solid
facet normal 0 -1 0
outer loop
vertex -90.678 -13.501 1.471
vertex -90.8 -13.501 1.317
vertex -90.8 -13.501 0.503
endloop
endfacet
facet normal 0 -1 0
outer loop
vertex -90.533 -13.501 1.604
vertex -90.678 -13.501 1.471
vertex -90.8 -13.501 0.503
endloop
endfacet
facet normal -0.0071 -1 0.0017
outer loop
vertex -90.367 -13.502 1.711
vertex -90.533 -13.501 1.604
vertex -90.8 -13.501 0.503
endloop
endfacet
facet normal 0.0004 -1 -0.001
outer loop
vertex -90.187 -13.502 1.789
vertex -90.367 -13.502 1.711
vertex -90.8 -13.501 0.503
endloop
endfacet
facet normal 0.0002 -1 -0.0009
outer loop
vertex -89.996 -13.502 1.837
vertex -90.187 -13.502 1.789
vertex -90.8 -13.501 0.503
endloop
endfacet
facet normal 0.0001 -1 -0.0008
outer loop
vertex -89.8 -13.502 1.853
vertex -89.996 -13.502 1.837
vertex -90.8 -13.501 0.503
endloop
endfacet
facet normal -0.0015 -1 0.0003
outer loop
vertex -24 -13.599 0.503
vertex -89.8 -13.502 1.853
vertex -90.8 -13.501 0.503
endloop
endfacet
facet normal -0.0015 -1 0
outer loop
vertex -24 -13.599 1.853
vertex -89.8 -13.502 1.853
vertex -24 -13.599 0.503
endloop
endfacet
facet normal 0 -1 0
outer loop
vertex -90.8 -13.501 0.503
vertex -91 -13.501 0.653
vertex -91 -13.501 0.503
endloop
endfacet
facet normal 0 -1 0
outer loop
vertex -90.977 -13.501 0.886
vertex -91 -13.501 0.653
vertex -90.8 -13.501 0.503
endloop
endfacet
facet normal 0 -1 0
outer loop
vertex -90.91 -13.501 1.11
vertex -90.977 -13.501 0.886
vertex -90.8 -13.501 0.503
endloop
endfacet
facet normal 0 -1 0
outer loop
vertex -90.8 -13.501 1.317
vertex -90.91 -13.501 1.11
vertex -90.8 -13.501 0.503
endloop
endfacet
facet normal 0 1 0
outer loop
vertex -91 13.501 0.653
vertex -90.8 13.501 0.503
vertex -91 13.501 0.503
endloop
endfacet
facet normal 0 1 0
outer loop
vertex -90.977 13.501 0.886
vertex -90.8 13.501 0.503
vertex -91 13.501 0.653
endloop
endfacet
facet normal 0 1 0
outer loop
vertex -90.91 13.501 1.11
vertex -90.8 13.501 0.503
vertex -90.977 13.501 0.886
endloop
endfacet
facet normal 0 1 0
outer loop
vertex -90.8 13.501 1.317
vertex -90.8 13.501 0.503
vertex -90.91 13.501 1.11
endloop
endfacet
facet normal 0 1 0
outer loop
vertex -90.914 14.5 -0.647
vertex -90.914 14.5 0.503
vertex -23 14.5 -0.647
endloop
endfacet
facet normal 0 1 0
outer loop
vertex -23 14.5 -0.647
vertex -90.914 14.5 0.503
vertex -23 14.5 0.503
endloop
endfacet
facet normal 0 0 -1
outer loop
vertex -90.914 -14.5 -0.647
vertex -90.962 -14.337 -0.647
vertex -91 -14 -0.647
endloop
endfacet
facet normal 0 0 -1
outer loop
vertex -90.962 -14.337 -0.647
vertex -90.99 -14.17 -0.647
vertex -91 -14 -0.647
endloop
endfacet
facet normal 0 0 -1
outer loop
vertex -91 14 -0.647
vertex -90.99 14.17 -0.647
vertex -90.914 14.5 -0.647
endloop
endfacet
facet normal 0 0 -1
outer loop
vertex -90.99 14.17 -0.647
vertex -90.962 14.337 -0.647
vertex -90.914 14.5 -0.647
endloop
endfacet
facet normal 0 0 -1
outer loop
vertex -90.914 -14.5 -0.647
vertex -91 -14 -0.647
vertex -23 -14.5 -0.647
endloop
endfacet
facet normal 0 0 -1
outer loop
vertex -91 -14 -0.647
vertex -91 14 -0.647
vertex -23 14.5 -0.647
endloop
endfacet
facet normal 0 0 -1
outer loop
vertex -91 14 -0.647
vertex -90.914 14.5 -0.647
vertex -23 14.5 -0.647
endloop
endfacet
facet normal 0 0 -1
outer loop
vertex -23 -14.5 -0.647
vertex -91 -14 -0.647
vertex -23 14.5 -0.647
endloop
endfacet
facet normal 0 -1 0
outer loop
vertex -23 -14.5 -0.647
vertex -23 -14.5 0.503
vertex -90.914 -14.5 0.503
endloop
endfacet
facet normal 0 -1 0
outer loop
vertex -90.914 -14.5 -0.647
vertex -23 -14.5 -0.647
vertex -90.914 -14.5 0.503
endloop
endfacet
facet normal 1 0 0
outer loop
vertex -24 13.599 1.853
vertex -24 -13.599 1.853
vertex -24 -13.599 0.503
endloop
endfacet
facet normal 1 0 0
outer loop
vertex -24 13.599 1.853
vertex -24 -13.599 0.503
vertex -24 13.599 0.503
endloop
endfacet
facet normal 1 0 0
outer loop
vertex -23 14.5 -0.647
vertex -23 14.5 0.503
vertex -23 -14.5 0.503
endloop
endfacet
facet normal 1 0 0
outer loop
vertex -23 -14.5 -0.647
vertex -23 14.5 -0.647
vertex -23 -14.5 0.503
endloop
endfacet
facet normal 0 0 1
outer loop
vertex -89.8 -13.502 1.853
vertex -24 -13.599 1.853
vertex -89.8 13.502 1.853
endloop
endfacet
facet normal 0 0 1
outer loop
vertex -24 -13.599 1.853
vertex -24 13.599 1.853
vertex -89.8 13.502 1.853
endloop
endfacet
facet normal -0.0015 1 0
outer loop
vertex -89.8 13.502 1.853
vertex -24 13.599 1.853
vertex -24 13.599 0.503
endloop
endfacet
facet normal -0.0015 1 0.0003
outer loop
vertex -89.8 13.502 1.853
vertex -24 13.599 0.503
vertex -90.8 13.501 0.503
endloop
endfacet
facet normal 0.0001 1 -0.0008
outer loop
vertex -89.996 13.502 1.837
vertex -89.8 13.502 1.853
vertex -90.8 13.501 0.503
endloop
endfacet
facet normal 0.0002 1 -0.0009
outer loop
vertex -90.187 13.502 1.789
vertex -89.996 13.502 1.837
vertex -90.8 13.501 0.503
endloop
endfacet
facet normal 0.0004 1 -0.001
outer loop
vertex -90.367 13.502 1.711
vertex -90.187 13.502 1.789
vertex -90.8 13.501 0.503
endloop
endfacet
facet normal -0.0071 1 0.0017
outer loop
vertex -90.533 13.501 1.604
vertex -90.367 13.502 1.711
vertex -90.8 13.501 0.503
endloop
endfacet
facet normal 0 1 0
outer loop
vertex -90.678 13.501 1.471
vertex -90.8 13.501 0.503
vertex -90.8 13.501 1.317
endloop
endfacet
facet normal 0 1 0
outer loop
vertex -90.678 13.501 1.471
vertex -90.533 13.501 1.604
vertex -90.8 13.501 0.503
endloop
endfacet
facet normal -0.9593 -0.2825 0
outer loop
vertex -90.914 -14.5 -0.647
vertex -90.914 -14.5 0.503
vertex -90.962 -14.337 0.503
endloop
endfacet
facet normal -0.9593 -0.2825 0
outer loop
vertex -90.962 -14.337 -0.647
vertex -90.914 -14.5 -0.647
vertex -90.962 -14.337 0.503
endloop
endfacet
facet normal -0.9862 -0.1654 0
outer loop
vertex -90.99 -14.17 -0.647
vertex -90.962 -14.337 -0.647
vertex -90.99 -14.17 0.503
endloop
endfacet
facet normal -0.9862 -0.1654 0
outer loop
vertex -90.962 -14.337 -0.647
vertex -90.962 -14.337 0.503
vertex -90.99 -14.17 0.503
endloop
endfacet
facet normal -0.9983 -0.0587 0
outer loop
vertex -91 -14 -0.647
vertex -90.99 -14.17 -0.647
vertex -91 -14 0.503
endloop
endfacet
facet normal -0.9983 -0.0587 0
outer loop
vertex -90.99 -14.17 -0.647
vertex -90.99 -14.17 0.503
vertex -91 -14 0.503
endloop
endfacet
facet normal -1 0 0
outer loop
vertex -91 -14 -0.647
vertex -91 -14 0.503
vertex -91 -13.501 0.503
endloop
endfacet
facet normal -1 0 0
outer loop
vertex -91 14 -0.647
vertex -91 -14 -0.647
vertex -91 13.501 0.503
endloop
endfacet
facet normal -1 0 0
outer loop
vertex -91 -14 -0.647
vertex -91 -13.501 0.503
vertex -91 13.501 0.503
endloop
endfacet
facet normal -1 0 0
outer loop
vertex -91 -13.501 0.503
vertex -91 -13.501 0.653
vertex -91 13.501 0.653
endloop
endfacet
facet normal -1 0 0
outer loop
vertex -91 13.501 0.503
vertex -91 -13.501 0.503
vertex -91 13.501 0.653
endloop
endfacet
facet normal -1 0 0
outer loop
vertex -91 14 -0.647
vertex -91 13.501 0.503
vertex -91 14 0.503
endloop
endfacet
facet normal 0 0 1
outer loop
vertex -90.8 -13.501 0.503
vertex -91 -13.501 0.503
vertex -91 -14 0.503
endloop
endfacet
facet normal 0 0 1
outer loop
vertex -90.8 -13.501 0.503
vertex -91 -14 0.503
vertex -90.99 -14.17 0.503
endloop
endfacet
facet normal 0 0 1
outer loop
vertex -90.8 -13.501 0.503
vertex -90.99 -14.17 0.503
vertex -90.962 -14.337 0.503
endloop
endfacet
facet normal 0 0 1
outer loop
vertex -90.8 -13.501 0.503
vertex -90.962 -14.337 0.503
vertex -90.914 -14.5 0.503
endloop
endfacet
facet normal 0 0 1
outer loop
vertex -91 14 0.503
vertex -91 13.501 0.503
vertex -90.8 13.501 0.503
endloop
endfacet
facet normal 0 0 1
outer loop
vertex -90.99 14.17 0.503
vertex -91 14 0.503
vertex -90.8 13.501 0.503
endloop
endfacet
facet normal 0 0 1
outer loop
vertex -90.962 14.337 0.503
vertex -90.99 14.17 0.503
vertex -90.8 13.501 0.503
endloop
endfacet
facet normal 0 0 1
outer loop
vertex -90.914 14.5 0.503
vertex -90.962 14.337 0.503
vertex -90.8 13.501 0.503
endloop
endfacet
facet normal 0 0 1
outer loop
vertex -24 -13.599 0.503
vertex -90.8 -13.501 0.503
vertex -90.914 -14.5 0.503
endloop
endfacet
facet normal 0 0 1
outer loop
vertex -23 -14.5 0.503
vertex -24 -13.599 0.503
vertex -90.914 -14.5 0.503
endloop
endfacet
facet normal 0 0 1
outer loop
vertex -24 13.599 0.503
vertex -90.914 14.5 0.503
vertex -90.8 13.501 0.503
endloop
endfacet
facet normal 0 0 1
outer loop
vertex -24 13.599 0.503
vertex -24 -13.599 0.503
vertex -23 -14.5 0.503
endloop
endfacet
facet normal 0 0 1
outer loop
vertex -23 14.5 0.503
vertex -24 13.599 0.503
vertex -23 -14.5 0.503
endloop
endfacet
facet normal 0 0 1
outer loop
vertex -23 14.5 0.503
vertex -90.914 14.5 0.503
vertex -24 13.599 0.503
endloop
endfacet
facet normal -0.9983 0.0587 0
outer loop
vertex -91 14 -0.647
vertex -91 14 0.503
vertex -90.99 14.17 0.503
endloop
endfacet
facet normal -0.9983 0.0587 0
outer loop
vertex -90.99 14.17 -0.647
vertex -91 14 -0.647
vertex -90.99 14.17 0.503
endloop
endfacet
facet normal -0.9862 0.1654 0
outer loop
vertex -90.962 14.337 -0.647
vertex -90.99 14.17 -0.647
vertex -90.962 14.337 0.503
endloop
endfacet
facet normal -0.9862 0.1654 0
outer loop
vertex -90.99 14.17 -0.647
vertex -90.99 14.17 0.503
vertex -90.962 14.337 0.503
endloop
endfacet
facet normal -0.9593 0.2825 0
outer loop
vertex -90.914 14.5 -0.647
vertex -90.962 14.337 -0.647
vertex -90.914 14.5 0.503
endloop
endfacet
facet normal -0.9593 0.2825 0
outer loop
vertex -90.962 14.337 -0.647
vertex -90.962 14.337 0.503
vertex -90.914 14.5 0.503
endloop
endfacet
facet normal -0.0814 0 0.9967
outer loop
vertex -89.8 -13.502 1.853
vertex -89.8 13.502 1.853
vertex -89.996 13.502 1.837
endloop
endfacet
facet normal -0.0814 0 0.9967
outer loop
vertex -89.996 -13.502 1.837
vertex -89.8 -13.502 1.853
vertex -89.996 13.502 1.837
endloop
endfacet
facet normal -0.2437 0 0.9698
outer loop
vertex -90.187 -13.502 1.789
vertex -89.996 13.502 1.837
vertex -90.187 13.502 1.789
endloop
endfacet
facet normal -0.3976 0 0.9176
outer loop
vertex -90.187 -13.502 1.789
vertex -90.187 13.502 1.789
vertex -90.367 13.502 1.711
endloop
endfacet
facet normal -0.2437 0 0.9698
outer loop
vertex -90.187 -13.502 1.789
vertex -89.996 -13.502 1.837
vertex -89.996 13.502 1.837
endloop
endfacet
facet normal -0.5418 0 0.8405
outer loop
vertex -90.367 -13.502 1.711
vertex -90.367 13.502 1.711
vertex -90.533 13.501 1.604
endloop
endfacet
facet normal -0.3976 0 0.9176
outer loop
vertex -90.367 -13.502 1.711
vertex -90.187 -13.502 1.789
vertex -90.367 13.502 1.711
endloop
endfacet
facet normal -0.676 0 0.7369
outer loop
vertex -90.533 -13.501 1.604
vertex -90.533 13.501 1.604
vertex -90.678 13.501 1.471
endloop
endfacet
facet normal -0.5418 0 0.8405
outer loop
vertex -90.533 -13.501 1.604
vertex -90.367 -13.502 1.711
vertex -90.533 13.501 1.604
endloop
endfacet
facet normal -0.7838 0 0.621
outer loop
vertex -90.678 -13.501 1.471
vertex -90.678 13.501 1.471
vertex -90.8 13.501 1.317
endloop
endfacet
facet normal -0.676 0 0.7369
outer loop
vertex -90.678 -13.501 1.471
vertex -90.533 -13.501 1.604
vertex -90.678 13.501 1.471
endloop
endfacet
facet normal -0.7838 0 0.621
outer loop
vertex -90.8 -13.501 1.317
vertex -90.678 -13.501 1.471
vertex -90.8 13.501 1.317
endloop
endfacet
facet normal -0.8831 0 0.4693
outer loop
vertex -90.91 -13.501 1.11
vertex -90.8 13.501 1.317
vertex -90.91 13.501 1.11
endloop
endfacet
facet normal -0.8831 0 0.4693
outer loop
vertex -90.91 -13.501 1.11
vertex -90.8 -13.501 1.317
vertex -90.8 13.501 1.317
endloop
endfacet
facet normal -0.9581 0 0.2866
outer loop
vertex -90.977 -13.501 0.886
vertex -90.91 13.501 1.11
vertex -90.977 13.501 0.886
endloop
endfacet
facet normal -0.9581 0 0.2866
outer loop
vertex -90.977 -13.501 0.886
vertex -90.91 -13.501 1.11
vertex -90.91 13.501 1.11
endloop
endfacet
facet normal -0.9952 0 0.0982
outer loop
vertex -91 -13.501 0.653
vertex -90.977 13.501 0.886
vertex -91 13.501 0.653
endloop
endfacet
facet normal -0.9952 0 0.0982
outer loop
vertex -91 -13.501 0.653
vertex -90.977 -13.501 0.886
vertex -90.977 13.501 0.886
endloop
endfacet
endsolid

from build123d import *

# Parameters (mm, degrees)
EXTRUDE_1_DEPTH     = 1.15
CUT_EXTRUDE_1_DEPTH = 1.23
EXTRUDE_2_DEPTH     = 1.35
CUT_EXTRUDE_START   = -10
CUT_EXTRUDE_2_DEPTH = 10
CUT_EXTRUDE_3_DEPTH = 1.35
FILLET_1_R          = 1.2


with BuildPart() as part:
    # 草图1 → 凸台-拉伸1 (new body)
    with BuildSketch(Plane.XY.offset(-0.646576548)):
        with BuildLine():
            Line((-91.3, 11.1), (-91.3, -11.1))
            Line((-91.3, -11.1), (-91.3, -14))
            ThreePointArc((-91.3, -14), (-91.252485776, -14.410844989), (-91.11245155, -14.8))
            Line((-91.11245155, -14.8), (-22.7, -14.8))
            Line((-22.7, -14.8), (-22.7, 14.8))
            Line((-22.7, 14.8), (-91.11245155, 14.8))
            ThreePointArc((-91.11245155, 14.8), (-91.252485776, 14.410844989), (-91.3, 14))
            Line((-91.3, 14), (-91.3, 11.1))
        make_face()
    extrude(amount=EXTRUDE_1_DEPTH)

    # 草图2 → 切除-拉伸1 (cut)
    with BuildSketch(Plane.XY.offset(0.503423452)):
        with BuildLine():
            Line((-91.4, 14), (-91.4, -14))
            ThreePointArc((-91.4, -14), (-91.342458697, -14.464053822), (-91.173320053, -14.9))
            Line((-91.173320053, -14.9), (-22.6, -14.9))
            Line((-22.6, -14.9), (-22.6, 14.9))
            Line((-22.6, 14.9), (-91.173320053, 14.9))
            ThreePointArc((-91.173320053, 14.9), (-91.342458697, 14.464053822), (-91.4, 14))
        make_face()
        with BuildLine():
            Line((-91.2, 14), (-91.2, -14))
            ThreePointArc((-91.2, -14), (-91.161870734, -14.358030253), (-91.049193338, -14.7))
            Line((-91.049193338, -14.7), (-22.8, -14.7))
            Line((-22.8, -14.7), (-22.8, 14.7))
            Line((-22.8, 14.7), (-91.049193338, 14.7))
            ThreePointArc((-91.049193338, 14.7), (-91.161870734, 14.358030253), (-91.2, 14))
        make_face(mode=Mode.SUBTRACT)
    extrude(amount=-CUT_EXTRUDE_1_DEPTH, mode=Mode.SUBTRACT)

    # 草图4 → 凸台-拉伸2 (add)
    with BuildSketch(Plane.XY.offset(0.503423452)):
        Polygon((-91.2, 13.700440852), (-23.8, 13.799558499), (-23.8, -13.799558499), (-91.2, -13.700440852), align=None)
    extrude(amount=EXTRUDE_2_DEPTH)

    # 草图5 → 切除-拉伸2 (cut)
    with BuildSketch(Plane(origin=(0, 0, -0.646576548), x_dir=(-1, 0, 0), z_dir=(0, 0, -1)).offset(CUT_EXTRUDE_START)):
        with BuildLine():
            Line((91.049193338, 14.7), (22.8, 14.7))
            Line((22.8, 14.7), (22.8, -14.7))
            Line((22.8, -14.7), (91.049193338, -14.7))
            ThreePointArc((91.049193338, -14.7), (91.161870734, -14.358030253), (91.2, -14))
            Line((91.2, -14), (91.2, 14))
            ThreePointArc((91.2, 14), (91.161870734, 14.358030253), (91.049193338, 14.7))
        make_face()
        with BuildLine():
            Line((90.914213562, 14.5), (23, 14.5))
            Line((23, 14.5), (23, -14.5))
            Line((23, -14.5), (90.914213562, -14.5))
            ThreePointArc((90.914213562, -14.5), (90.978397839, -14.253652968), (91, -14))
            Line((91, -14), (91, 14))
            ThreePointArc((91, 14), (90.978397839, 14.253652968), (90.914213562, 14.5))
        make_face(mode=Mode.SUBTRACT)
    extrude(amount=CUT_EXTRUDE_2_DEPTH, mode=Mode.SUBTRACT)

    # 草图6 → 切除-拉伸3 (cut)
    with BuildSketch(Plane.XY.offset(1.853423452)):
        Polygon((-24, 13.599264165), (-90.8, 13.501028871), (-91, 13.501028871), (-91, 13.70073497), (-23.8, 13.799558499), (-23.8, -13.799558499), (-91, -13.70073497), (-91, -13.501028871), (-90.8, -13.501028871), (-24, -13.599264165), align=None)
    extrude(amount=-CUT_EXTRUDE_3_DEPTH, mode=Mode.SUBTRACT)

    # 圆角1
    fillet_1_edges = [part.edges().sort_by_distance(p)[0] for p in [
        (-91, 0, 1.853423452),
    ]]
    fillet(fillet_1_edges, radius=FILLET_1_R)


solid = part.part
